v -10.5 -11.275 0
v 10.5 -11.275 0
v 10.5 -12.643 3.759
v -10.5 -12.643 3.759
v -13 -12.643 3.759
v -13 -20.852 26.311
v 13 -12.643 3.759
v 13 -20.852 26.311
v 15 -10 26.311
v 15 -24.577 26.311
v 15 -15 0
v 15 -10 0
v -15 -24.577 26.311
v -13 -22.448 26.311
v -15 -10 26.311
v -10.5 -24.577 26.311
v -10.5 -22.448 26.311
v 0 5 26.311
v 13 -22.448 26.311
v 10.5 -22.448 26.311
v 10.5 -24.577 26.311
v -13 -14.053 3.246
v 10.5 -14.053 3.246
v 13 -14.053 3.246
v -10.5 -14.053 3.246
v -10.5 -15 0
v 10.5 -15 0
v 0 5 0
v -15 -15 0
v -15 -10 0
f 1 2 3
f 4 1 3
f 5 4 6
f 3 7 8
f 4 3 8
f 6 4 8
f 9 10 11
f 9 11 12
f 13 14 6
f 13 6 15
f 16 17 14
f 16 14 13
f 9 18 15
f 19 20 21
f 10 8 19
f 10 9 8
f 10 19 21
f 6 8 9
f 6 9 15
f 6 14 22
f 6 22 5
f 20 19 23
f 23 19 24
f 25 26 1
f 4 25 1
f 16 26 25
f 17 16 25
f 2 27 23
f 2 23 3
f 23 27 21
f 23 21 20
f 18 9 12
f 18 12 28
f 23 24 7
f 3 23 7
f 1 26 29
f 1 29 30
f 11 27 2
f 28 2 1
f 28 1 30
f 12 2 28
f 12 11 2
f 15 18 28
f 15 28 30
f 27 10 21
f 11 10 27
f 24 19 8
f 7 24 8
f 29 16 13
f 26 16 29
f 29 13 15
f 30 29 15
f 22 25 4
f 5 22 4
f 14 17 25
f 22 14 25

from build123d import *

# Parameters (mm, degrees)
F1_DEPTH = 15
F2_DEPTH = 13
F3_DEPTH = 10.5
F4_DEPTH = 10.5
F6_DEPTH = 30


with BuildPart() as f1:
    # F0 (on Right) → F1 (new body, symmetric)
    with BuildSketch(Plane.YZ):
        Polygon((-24.5765640131, 26.311393382), (-15, 0), (-12.871644455, 0), (-14.0529973008, 3.2457402682), (-22.4482084682, 26.311393382), align=None)
        Polygon((-22.4482084682, 26.311393382), (-14.0529973008, 3.2457402682), (-12.6434583696, 3.7587704831), (-20.8519418095, 26.311393382), align=None)
        Polygon((-14.0529973008, 3.2457402682), (-12.871644455, 0), (-11.2753777963, 0), (-12.6434583696, 3.7587704831), align=None)
        Polygon((-12.6434583696, 3.7587704831), (-11.2753777963, 0), (15, 0), (15, 26.311393382), (-20.8519418095, 26.311393382), align=None)
    extrude(amount=F1_DEPTH, both=True)

    # F0 (on Right) → F2 (cut, symmetric)
    with BuildSketch(Plane.YZ):
        Polygon((-22.4482084682, 26.311393382), (-14.0529973008, 3.2457402682), (-12.6434583696, 3.7587704831), (-20.8519418095, 26.311393382), align=None)
    extrude(amount=F2_DEPTH, both=True, mode=Mode.SUBTRACT)

    # F0 (on Right) → F3 (cut, symmetric)
    with BuildSketch(Plane.YZ):
        Polygon((-24.5765640131, 26.311393382), (-15, 0), (-12.871644455, 0), (-14.0529973008, 3.2457402682), (-22.4482084682, 26.311393382), align=None)
    extrude(amount=F3_DEPTH, both=True, mode=Mode.SUBTRACT)

    # F0 (on Right) → F4 (cut, symmetric)
    with BuildSketch(Plane.YZ):
        Polygon((-14.0529973008, 3.2457402682), (-12.871644455, 0), (-11.2753777963, 0), (-12.6434583696, 3.7587704831), align=None)
    extrude(amount=F4_DEPTH, both=True, mode=Mode.SUBTRACT)

    # F5 (on face) → F6 (cut)
    with BuildSketch(Plane(origin=(0, 0, 0), x_dir=(1, 0, 0), z_dir=(0, 0, -1))):
        Polygon((0, -5), (-15, 10), (-15, -15), (15, -15), (15, 10), align=None)
    extrude(amount=-F6_DEPTH, mode=Mode.SUBTRACT)


solid = f1.part
